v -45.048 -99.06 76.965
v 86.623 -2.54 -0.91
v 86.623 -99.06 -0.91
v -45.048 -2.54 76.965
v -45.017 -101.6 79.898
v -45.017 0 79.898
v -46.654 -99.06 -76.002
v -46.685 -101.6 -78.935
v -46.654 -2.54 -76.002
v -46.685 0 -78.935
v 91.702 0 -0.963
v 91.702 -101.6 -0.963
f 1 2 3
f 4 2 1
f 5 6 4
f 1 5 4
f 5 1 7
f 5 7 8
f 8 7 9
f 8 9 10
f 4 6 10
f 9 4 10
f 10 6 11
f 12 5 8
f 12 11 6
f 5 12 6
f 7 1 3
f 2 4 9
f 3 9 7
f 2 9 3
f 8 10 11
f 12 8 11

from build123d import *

# Parameters (mm, degrees)
F1_DEPTH = 101.6
F2_T     = -2.54


with BuildPart() as f1:
    # F0 (on Front) → F1 (new body)
    with BuildSketch(Plane.XZ):
        Polygon((91.702374, -0.963147), (-45.017077, 79.898159), (-46.685297, -78.935012), align=None)
    extrude(amount=F1_DEPTH)

    # F2
    f2_openings = [f1.faces().sort_by_distance(p)[0] for p in [
        (-45.851187, -50.8, 0.481574),
    ]]
    offset(amount=F2_T, openings=f2_openings)


solid = f1.part
